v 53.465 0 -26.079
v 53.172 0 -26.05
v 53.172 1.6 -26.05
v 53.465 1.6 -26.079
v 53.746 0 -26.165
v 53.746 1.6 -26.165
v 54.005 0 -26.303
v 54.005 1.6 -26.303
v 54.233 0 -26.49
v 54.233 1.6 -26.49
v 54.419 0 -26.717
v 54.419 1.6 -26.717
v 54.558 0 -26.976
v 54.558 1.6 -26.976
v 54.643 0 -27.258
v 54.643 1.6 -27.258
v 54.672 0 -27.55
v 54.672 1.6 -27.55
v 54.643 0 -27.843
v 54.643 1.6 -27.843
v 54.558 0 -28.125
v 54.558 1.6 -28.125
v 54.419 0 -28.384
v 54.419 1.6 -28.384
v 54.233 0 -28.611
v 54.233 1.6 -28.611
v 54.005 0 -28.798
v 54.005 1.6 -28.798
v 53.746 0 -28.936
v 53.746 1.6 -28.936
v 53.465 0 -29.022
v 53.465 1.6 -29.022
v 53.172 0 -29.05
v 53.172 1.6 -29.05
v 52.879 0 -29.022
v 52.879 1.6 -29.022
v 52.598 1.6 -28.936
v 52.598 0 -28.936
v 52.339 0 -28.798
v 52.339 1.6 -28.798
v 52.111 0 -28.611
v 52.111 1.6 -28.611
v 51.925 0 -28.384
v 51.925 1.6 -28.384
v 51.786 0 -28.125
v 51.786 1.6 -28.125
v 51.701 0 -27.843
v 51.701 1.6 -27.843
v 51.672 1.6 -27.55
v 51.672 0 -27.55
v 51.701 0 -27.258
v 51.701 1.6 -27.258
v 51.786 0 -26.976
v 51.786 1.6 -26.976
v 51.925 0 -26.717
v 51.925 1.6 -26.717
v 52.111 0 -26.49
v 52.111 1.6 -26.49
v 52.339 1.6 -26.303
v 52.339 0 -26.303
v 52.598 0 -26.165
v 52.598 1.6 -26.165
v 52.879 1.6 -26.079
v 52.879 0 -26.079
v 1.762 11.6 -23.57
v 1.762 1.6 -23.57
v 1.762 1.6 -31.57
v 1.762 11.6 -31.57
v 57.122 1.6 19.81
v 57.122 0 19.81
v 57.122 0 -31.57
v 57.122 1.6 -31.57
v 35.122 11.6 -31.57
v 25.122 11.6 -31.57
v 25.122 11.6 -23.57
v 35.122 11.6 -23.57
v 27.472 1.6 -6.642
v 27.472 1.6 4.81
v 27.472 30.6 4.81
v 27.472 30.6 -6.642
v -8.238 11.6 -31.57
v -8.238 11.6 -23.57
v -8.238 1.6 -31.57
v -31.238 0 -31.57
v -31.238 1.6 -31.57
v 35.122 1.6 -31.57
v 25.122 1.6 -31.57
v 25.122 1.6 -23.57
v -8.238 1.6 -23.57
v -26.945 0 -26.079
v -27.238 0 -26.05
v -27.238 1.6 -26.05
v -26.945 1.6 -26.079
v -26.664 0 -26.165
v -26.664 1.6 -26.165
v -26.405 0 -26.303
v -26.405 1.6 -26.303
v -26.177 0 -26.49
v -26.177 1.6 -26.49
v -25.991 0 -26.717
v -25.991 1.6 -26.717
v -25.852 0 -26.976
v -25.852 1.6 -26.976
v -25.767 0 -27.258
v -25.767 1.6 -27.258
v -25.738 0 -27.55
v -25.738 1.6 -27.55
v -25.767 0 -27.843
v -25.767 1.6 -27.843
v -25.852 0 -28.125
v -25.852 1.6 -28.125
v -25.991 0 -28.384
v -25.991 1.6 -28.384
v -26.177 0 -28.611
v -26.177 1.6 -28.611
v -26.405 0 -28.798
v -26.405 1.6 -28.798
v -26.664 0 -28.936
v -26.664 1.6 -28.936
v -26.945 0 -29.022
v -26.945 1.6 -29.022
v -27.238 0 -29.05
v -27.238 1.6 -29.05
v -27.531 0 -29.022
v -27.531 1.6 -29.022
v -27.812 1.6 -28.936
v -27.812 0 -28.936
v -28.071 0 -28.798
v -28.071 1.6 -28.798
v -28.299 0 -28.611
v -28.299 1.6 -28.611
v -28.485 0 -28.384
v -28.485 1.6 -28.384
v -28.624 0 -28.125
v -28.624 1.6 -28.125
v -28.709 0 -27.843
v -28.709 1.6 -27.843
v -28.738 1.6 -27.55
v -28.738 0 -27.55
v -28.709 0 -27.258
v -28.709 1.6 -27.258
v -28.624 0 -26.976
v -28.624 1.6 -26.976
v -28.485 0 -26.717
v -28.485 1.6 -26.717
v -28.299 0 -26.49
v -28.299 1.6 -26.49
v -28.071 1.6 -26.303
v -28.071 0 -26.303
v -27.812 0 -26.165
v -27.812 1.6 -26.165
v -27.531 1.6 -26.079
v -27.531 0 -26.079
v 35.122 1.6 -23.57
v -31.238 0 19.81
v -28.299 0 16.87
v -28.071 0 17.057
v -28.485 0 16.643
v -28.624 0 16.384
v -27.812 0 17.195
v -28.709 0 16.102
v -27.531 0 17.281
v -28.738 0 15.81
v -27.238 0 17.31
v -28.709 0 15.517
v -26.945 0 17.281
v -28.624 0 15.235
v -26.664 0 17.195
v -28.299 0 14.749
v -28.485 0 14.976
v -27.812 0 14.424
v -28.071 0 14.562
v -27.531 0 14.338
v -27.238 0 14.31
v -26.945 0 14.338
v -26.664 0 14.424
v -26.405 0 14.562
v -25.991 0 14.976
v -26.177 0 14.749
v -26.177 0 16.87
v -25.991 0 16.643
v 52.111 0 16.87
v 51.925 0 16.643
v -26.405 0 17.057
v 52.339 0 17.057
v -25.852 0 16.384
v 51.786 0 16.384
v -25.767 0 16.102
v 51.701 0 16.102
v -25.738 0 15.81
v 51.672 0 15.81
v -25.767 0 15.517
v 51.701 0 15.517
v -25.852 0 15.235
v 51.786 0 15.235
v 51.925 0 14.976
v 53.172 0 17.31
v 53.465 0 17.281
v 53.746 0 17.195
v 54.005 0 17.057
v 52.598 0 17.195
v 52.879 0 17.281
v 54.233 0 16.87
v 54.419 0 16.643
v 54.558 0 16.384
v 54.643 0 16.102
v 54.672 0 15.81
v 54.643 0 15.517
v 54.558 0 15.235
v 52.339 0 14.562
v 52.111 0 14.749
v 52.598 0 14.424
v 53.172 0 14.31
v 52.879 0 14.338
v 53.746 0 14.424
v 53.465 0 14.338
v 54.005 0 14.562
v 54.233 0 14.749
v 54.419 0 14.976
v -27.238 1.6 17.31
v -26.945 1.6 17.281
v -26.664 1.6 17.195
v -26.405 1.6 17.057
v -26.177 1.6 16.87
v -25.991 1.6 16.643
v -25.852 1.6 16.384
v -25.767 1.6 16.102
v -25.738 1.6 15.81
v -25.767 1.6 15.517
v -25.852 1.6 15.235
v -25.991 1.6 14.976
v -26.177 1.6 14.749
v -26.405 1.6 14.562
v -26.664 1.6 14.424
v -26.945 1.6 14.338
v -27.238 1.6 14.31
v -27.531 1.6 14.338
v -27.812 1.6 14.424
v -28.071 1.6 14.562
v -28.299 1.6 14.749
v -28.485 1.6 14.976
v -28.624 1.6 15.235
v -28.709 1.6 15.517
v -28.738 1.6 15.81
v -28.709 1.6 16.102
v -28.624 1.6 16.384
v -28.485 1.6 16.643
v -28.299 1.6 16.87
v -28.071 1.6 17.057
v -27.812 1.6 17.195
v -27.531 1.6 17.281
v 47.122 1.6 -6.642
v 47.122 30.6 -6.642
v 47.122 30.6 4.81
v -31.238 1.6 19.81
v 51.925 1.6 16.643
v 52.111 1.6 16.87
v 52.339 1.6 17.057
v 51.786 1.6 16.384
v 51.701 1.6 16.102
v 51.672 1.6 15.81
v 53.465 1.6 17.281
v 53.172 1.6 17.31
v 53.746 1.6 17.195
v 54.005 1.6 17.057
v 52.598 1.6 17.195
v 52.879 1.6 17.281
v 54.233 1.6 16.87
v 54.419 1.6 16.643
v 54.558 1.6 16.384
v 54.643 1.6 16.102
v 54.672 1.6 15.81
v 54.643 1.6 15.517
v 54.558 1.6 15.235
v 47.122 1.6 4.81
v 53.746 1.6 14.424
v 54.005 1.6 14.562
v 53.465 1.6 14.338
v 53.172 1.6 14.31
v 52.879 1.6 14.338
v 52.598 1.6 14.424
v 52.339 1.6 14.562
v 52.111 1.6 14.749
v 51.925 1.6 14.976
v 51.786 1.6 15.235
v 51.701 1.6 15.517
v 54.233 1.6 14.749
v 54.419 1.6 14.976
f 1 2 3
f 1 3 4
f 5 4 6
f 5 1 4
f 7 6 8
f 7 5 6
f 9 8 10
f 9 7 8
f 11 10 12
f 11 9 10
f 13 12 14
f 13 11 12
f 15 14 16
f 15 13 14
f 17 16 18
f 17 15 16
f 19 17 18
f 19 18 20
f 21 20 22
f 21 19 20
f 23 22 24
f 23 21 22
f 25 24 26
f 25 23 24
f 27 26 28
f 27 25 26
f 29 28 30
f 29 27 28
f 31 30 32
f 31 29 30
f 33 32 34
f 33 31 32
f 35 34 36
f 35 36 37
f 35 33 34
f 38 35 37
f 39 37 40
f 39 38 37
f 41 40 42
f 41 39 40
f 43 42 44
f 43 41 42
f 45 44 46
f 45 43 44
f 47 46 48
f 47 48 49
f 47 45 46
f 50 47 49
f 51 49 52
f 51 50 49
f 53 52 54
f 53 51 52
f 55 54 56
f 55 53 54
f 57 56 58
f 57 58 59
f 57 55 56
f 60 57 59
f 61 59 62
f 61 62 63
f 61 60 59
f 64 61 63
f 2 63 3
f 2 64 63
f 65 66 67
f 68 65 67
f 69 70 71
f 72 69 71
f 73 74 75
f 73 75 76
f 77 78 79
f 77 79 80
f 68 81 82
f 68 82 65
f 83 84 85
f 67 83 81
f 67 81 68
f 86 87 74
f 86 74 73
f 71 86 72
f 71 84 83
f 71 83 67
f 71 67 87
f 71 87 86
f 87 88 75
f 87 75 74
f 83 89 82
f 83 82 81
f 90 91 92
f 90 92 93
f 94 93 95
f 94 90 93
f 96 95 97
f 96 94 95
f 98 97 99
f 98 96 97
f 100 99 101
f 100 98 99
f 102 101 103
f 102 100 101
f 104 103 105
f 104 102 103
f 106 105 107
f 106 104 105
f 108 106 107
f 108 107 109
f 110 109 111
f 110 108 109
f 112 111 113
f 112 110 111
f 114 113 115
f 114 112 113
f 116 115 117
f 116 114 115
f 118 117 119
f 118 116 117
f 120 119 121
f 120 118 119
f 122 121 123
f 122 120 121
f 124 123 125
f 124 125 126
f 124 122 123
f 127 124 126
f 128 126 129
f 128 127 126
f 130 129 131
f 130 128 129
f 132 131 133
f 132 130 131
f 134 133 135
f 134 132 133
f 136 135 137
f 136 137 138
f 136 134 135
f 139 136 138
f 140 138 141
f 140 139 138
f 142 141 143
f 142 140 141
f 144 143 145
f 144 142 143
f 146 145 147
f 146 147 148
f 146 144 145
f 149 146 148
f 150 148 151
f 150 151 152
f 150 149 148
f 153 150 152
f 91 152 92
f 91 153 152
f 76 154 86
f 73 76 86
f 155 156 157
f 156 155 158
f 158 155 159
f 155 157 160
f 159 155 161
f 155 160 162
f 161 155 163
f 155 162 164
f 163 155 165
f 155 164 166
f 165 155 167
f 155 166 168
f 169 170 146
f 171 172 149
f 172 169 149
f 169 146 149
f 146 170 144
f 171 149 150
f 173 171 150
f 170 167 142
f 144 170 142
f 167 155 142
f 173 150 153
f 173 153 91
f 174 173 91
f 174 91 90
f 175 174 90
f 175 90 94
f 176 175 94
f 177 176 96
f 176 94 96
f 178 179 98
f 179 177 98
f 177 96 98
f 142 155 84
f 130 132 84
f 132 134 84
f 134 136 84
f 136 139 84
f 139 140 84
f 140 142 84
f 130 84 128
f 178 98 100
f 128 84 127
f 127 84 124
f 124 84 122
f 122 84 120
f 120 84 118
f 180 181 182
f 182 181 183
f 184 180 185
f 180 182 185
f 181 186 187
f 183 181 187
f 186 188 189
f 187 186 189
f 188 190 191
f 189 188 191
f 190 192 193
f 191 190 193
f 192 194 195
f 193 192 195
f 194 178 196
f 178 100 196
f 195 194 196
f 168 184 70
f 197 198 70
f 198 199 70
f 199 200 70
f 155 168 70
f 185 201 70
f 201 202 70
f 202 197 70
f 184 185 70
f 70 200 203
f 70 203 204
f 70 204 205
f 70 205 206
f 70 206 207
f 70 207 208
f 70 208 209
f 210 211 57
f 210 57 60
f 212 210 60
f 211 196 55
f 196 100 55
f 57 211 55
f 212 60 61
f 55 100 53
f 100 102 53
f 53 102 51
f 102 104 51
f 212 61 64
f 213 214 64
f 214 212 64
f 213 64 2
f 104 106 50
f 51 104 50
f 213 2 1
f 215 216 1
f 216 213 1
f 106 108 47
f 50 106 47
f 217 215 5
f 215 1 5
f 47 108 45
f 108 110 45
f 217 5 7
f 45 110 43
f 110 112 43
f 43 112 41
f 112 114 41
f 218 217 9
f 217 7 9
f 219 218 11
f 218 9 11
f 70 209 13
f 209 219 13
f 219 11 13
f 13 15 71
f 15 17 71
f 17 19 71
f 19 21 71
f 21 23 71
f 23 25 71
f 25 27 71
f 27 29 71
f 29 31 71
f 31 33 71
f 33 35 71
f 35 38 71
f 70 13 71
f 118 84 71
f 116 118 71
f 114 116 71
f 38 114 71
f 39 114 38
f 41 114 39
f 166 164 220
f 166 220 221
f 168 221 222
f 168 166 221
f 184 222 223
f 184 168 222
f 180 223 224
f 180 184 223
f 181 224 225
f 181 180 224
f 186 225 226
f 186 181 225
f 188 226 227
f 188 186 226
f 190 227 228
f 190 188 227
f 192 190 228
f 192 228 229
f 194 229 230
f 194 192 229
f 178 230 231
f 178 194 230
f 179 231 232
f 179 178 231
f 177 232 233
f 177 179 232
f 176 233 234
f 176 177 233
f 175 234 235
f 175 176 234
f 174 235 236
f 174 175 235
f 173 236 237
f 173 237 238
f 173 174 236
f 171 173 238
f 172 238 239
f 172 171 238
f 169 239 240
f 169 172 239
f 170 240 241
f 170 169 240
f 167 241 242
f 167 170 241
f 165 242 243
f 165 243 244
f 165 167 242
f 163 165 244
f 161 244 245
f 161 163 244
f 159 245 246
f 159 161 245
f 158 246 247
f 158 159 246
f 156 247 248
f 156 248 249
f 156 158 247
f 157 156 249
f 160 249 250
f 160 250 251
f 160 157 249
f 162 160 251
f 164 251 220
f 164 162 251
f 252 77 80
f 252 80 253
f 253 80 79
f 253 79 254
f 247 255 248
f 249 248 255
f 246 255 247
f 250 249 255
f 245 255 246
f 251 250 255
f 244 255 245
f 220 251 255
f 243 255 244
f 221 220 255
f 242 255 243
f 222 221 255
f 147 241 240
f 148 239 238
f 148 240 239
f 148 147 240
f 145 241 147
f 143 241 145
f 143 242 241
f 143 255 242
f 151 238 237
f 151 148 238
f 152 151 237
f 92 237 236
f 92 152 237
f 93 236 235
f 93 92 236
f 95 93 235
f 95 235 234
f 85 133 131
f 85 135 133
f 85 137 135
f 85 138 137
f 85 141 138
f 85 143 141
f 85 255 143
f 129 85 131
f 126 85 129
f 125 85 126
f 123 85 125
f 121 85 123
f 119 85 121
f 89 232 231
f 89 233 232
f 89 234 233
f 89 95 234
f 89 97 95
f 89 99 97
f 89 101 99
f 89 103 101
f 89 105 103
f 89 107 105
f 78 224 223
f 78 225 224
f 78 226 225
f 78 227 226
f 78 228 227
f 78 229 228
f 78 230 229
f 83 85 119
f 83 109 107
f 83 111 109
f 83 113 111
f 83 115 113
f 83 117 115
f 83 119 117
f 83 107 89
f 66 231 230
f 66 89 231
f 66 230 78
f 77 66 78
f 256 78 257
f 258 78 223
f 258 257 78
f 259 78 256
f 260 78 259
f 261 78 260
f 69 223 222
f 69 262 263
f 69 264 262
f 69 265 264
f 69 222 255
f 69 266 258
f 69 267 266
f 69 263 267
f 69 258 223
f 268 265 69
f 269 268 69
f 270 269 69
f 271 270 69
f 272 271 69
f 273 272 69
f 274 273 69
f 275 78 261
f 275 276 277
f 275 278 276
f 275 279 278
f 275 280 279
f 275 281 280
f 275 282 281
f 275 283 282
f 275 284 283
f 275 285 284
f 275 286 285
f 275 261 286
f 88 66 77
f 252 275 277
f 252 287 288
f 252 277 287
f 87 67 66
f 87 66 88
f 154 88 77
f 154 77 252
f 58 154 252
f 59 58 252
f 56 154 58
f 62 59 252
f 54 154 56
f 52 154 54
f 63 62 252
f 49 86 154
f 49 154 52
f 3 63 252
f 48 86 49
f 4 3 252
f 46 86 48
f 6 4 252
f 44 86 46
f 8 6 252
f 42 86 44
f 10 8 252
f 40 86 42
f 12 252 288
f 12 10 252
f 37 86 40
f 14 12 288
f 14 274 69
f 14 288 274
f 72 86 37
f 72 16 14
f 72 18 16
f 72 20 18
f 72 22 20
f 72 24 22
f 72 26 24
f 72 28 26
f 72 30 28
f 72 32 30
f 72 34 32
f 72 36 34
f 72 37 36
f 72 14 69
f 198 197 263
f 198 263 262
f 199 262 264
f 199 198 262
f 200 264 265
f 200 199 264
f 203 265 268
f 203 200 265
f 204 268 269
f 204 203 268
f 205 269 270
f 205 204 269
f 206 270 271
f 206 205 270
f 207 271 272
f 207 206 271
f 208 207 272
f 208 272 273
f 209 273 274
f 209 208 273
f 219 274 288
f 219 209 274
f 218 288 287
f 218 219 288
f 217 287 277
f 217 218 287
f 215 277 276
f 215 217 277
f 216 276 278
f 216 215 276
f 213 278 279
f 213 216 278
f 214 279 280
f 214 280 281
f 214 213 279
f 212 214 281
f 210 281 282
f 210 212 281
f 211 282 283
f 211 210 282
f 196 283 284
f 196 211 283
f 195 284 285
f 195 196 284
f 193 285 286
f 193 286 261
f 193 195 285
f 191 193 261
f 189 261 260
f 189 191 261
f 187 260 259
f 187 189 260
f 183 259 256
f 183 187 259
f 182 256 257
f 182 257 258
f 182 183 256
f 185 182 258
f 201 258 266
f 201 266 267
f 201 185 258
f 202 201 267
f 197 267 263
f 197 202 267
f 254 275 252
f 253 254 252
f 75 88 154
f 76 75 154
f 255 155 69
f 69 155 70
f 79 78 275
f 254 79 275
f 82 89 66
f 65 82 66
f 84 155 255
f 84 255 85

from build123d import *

# Parameters (mm, degrees)
ESQUISSE1_W        = 88.36
ESQUISSE1_H        = 51.38
ESQUISSE1_R        = 1.5
BOSS_EXTRU_2_DEPTH = 1.6
ESQUISSE3_W        = 10
ESQUISSE3_H        = 8
BOSS_EXTRU_3_DEPTH = 10
ESQUISSE4_W        = 19.65008467
ESQUISSE4_H        = 11.451158756
BOSS_EXTRU_4_DEPTH = 29


with BuildPart() as part:
    # Esquisse1 → Boss.-Extru.2 (new body)
    with BuildSketch(Plane(origin=(0, 0, 0), x_dir=(1, 0, 0), z_dir=(0, 1, 0))):
        with Locations((12.941904762, 5.88047619)):
            Rectangle(ESQUISSE1_W, ESQUISSE1_H)
        with Locations(Location((-27.238095238, -15.80952381, 0), (0, 0, 270))):
            Circle(ESQUISSE1_R, mode=Mode.SUBTRACT)
        with Locations(Location((53.171904762, -15.80952381, 0), (0, 0, 270))):
            Circle(ESQUISSE1_R, mode=Mode.SUBTRACT)
        with Locations(Location((53.171904762, 27.55047619, 0), (0, 0, 270))):
            Circle(ESQUISSE1_R, mode=Mode.SUBTRACT)
        with Locations(Location((-27.238095238, 27.55047619, 0), (0, 0, 270))):
            Circle(ESQUISSE1_R, mode=Mode.SUBTRACT)
    extrude(amount=BOSS_EXTRU_2_DEPTH)

    # Esquisse3 → Boss.-Extru.3 (add)
    with BuildSketch(Plane(origin=(0, 1.6, 0), x_dir=(1, 0, 0), z_dir=(0, 1, 0))):
        with Locations((30.121904762, 27.57047619)):
            Rectangle(ESQUISSE3_W, ESQUISSE3_H)
        with Locations((-3.238095238, 27.57047619)):
            Rectangle(ESQUISSE3_W, ESQUISSE3_H)
    extrude(amount=BOSS_EXTRU_3_DEPTH)

    # Esquisse4 → Boss.-Extru.4 (add)
    with BuildSketch(Plane(origin=(0, 1.6, 0), x_dir=(1, 0, 0), z_dir=(0, 1, 0))):
        with Locations((37.296862427, 0.916055568)):
            Rectangle(ESQUISSE4_W, ESQUISSE4_H)
    extrude(amount=BOSS_EXTRU_4_DEPTH)


solid = part.part
